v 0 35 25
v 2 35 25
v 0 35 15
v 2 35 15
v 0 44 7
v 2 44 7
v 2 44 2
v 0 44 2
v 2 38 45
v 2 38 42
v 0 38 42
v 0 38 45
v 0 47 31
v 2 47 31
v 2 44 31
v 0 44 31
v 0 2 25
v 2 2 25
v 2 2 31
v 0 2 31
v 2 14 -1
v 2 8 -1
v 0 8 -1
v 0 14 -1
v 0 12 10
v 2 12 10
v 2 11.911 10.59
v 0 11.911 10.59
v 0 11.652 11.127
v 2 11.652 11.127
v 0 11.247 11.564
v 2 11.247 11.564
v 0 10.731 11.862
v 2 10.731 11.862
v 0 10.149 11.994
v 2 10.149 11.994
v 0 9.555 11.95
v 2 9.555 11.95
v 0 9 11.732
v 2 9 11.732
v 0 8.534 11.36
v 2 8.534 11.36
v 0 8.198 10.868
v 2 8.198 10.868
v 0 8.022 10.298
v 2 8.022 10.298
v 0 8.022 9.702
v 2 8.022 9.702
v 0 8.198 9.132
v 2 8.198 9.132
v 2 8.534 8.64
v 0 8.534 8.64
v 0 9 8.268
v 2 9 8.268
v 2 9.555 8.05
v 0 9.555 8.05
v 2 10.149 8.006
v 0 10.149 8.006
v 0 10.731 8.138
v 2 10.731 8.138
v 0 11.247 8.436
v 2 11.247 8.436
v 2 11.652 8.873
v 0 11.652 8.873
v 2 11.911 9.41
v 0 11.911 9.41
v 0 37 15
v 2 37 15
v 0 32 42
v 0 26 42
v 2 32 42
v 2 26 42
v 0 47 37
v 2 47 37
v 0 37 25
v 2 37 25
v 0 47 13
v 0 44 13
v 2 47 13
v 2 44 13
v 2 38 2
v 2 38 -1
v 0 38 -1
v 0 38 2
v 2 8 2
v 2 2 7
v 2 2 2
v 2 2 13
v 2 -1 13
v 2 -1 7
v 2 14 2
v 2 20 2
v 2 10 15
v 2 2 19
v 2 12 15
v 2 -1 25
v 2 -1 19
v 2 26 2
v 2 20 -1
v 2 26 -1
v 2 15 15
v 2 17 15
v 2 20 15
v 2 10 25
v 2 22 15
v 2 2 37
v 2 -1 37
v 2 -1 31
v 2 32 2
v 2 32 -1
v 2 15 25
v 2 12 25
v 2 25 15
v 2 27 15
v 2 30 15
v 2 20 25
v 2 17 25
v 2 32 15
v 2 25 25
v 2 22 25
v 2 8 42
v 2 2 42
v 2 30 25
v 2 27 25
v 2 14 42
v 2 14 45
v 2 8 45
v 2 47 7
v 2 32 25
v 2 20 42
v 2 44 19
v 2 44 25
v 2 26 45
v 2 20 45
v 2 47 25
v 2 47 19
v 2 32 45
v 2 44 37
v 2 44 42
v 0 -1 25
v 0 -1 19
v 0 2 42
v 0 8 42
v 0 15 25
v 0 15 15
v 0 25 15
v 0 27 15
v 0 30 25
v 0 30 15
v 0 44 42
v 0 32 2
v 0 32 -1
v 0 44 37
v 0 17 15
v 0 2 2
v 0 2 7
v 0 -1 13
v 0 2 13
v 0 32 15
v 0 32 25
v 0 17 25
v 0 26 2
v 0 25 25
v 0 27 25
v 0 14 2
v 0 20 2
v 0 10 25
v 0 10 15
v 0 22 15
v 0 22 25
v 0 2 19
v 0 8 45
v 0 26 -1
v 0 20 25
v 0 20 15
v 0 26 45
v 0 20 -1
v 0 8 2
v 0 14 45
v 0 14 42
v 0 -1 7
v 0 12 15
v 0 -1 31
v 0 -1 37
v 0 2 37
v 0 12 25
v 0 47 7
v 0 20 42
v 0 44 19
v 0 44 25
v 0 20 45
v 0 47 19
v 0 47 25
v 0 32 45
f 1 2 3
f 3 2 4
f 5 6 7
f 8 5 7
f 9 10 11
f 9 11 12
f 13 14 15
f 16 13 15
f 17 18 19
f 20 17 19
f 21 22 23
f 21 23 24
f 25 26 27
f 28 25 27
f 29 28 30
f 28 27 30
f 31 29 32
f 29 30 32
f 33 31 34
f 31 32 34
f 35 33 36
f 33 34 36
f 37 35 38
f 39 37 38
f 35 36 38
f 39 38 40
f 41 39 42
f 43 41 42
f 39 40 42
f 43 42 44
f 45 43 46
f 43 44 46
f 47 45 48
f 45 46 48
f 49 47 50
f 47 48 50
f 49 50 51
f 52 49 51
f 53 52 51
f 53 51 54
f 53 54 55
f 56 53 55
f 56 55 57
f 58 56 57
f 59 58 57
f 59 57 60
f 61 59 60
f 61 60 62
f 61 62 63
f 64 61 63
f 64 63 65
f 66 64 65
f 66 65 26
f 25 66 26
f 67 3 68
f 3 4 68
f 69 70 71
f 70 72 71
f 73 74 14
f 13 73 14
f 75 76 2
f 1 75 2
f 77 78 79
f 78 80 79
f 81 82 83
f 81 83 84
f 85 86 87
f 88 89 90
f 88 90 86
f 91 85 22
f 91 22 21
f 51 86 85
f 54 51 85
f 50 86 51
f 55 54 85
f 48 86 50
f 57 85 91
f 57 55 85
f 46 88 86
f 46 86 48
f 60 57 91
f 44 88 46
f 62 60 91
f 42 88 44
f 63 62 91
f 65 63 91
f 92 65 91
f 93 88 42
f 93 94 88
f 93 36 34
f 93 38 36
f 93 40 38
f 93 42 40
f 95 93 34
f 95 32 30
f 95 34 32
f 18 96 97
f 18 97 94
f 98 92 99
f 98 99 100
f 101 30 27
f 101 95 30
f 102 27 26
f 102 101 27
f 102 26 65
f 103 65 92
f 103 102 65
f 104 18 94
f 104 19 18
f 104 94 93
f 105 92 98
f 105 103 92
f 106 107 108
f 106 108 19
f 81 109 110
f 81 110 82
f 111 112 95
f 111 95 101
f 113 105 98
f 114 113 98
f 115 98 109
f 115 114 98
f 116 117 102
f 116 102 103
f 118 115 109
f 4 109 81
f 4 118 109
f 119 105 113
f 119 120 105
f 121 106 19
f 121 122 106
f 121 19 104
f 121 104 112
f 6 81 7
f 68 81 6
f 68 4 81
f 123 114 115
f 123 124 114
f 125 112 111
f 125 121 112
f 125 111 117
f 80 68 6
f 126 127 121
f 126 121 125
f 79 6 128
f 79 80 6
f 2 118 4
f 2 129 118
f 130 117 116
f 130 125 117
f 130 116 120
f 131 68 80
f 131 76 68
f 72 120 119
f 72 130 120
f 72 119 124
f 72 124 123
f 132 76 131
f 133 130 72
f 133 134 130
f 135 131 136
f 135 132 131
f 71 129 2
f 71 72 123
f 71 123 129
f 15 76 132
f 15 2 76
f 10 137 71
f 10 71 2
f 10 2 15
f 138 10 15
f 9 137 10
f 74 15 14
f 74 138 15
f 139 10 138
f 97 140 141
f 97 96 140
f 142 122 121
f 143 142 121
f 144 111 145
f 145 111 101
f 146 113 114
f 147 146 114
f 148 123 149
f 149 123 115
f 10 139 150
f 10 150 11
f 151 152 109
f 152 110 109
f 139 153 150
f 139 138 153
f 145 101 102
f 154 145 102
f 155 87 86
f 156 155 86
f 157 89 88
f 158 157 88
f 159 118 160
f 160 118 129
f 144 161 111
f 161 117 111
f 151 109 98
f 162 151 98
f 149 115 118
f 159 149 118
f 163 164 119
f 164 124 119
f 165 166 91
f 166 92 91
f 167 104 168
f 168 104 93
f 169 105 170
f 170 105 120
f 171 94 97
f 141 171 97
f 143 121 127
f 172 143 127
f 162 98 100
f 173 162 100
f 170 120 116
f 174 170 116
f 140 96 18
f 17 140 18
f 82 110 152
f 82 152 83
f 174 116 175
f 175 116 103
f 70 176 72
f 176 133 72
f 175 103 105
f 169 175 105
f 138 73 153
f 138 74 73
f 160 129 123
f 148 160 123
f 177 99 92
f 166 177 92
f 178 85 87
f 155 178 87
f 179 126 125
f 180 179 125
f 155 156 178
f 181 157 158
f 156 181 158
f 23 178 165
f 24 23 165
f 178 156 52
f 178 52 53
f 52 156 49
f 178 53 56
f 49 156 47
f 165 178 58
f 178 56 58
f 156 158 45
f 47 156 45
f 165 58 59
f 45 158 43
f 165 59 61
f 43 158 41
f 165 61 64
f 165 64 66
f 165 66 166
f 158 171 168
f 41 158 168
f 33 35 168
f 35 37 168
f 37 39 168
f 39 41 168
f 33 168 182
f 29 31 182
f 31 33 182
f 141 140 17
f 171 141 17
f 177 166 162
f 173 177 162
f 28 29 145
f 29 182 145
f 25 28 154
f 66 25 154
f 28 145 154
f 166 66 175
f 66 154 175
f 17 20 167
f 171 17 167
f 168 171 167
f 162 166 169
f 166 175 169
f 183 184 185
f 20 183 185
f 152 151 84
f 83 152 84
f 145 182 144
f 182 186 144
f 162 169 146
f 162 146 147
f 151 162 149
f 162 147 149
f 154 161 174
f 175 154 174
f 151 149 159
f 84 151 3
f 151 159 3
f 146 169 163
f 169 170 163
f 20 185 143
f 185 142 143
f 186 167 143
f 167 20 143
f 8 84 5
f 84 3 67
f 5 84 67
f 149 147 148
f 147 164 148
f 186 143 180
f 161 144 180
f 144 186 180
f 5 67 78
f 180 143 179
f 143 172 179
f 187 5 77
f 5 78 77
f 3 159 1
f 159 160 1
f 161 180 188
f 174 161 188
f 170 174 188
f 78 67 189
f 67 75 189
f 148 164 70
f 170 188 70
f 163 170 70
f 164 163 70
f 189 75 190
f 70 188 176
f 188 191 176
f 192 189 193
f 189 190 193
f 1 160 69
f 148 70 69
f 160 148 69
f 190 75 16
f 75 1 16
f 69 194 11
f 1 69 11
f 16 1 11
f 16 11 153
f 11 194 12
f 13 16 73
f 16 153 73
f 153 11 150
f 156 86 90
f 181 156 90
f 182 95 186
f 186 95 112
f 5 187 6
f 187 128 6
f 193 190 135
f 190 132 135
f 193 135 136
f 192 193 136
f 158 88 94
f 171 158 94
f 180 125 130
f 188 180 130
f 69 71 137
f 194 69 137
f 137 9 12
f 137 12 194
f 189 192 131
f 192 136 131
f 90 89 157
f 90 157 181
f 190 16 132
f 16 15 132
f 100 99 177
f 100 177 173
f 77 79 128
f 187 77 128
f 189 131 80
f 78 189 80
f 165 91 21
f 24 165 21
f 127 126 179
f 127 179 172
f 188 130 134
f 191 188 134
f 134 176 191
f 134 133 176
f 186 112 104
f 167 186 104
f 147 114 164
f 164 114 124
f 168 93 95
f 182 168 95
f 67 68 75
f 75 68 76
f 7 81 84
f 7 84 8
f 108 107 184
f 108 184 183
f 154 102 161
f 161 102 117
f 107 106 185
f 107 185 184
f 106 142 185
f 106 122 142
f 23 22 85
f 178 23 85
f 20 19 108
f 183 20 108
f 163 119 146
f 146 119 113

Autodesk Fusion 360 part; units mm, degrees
sketch "スケッチ1" plane through (0, 0, 0) normal (1, 0, 0) x (0, 1, 0)
  line L0 (0, 0) -> (46, 0)
  line L1 (46, 0) -> (46, 44)
  line L2 (46, 44) -> (0, 44)
  line L3 (0, 44) -> (0, 0)
  dimension "d1" = 46
  dimension "d2" = 44
extrude "押し出し1" add sketch "スケッチ1" along normal blind 2
sketch "スケッチ2" plane through (2, 0, 0) normal (1, 0, 0) x (0, 1, 0)
  line L0 (0, 44) -> (0, 0)
  line L1 (0, 0) -> (46, 0)
  line L2 (46, 0) -> (46, 44)
  line L3 (46, 44) -> (0, 44)
  line L4 (0, 0) -> (8, 0)
  line L5 (8, 0) -> (8, 2)
  line L6 (8, 2) -> (0, 2)
  line L7 (0, 2) -> (0, 0)
  line L8 (14, 0) -> (20, 0)
  line L9 (20, 0) -> (20, 2)
  line L10 (20, 2) -> (14, 2)
  line L11 (14, 2) -> (14, 0)
  line L12 (26, 0) -> (32, 0)
  line L13 (32, 0) -> (32, 2)
  line L14 (32, 2) -> (26, 2)
  line L15 (26, 2) -> (26, 0)
  line L16 (46, 0) -> (38, 0)
  line L17 (38, 0) -> (38, 2)
  line L18 (38, 2) -> (46, 2)
  line L19 (46, 2) -> (46, 0)
  line L20 (32, 42) -> (32, 44)
  line L21 (32, 44) -> (26, 44)
  line L22 (20, 42) -> (20, 44)
  line L23 (38, 42) -> (38, 44)
  line L24 (38, 44) -> (46, 44)
  line L25 (46, 44) -> (46, 42)
  line L26 (0, 42) -> (8, 42)
  line L27 (26, 44) -> (26, 42)
  line L28 (8, 42) -> (8, 44)
  line L29 (8, 44) -> (0, 44)
  line L30 (0, 44) -> (0, 42)
  line L31 (20, 44) -> (14, 44)
  line L32 (26, 42) -> (32, 42)
  line L33 (46, 42) -> (38, 42)
  line L34 (14, 42) -> (20, 42)
  line L35 (14, 44) -> (14, 42)
  point P0 (0, 42)
  dimension "d5" = 8
  dimension "d6" = 2
  dimension "d7" = 6
  dimension "d8" = 2
  dimension "d9" = 6
  dimension "d10" = 6
  dimension "d11" = 2
  dimension "d12" = 6
  dimension "d13" = 6
  dimension "d14" = 2
extrude "押し出し2" cut sketch "スケッチ2" against normal blind 2 contours L0 L3 L26 L28 L29 L30 | L0 L1 L4 L5 L6 L7 | L3 L22 L31 L34 L35 | L3 L20 L21 L27 L32 | L1 L8 L9 L10 L11 | L2 L3 L23 L24 L25 L33 | L1 L12 L13 L14 L15 | L1 L2 L16 L17 L18 L19
sketch "スケッチ3" plane through (2, 0, 0) normal (1, 0, 0) x (0, 1, 0)
  line L0 (8, 2) -> (8, 0)
  line L1 (8, 0) -> (14, 0)
  line L2 (14, 0) -> (14, 2)
  line L3 (14, 2) -> (20, 2)
  line L4 (20, 2) -> (20, 0)
  line L5 (20, 0) -> (26, 0)
  line L6 (26, 0) -> (26, 2)
  line L7 (26, 2) -> (32, 2)
  line L8 (32, 2) -> (32, 0)
  line L9 (32, 0) -> (38, 0)
  line L10 (38, 0) -> (38, 2)
  line L11 (38, 2) -> (46, 2)
  line L12 (46, 2) -> (46, 42)
  line L13 (46, 42) -> (38, 42)
  line L14 (38, 42) -> (38, 44)
  line L15 (38, 44) -> (32, 44)
  line L16 (32, 44) -> (32, 42)
  line L17 (32, 42) -> (26, 42)
  line L18 (26, 42) -> (26, 44)
  line L19 (26, 44) -> (20, 44)
  line L20 (20, 44) -> (20, 42)
  line L21 (20, 42) -> (14, 42)
  line L22 (14, 42) -> (14, 44)
  line L23 (14, 44) -> (8, 44)
  line L24 (8, 44) -> (8, 42)
  line L25 (8, 42) -> (0, 42)
  line L26 (0, 42) -> (0, 2)
  line L27 (0, 2) -> (8, 2)
  line L28 (0, 44) -> (2, 44)
  line L29 (2, 44) -> (2, 37)
  line L30 (2, 37) -> (0, 37)
  line L31 (0, 37) -> (0, 44)
  line L32 (2, 31) -> (0, 31)
  line L33 (0, 31) -> (0, 25)
  line L34 (0, 25) -> (2, 25)
  line L35 (2, 25) -> (2, 31)
  line L36 (2, 19) -> (0, 19)
  line L37 (0, 19) -> (0, 13)
  line L38 (0, 13) -> (2, 13)
  line L39 (2, 13) -> (2, 19)
  line L40 (2, 7) -> (0, 7)
  line L41 (0, 7) -> (0, 0)
  line L42 (0, 0) -> (2, 0)
  line L43 (2, 0) -> (2, 7)
  line L44 (46, 31) -> (44, 31)
  line L45 (46, 13) -> (46, 19)
  line L46 (44, 44) -> (46, 44)
  line L47 (44, 0) -> (46, 0)
  line L48 (44, 7) -> (44, 0)
  line L49 (44, 25) -> (46, 25)
  line L50 (46, 37) -> (44, 37)
  line L51 (44, 37) -> (44, 44)
  line L52 (44, 13) -> (46, 13)
  line L53 (44, 31) -> (44, 25)
  line L54 (46, 19) -> (44, 19)
  line L55 (44, 19) -> (44, 13)
  line L56 (46, 25) -> (46, 31)
  line L57 (46, 7) -> (44, 7)
  line L58 (46, 0) -> (46, 7)
  line L59 (46, 44) -> (46, 37)
  point P0 (44, 0)
  dimension "d21" = 2
  dimension "d22" = 7
  dimension "d23" = 2
  dimension "d24" = 6
  dimension "d25" = 6
  dimension "d26" = 6
  dimension "d27" = 6
  dimension "d28" = 2
  dimension "d29" = 6
  dimension "d30" = 7
  dimension "d31" = 2
extrude "押し出し3" cut sketch "スケッチ3" against normal blind 2 contours L27 L41 L42 L43 | L26 L27 L40 L41 L43 | L26 L36 L37 L38 L39 | L26 L32 L33 L34 L35 | L25 L26 L29 L30 L31 | L25 L28 L29 L31 | L11 L12 L48 L57 L58 | L11 L47 L48 L58 | L12 L45 L52 L54 L55 | L12 L44 L49 L53 L56 | L12 L13 L50 L51 L59 | L13 L46 L51 L59
sketch "スケッチ4" plane through (2, 0, 0) normal (1, 0, 0) x (0, 1, 0)
  line L0 (44, 19) -> (46, 19)
  line L1 (46, 19) -> (46, 25)
  line L2 (46, 25) -> (44, 25)
  line L3 (44, 25) -> (44, 31)
  line L4 (44, 31) -> (46, 31)
  line L5 (46, 31) -> (46, 37)
  line L6 (46, 37) -> (44, 37)
  line L7 (44, 37) -> (44, 42)
  line L8 (44, 42) -> (38, 42)
  line L9 (38, 42) -> (38, 44)
  line L10 (38, 44) -> (32, 44)
  line L11 (32, 44) -> (32, 42)
  line L12 (32, 42) -> (26, 42)
  line L13 (26, 42) -> (26, 44)
  line L14 (26, 44) -> (20, 44)
  line L15 (20, 44) -> (20, 42)
  line L16 (20, 42) -> (14, 42)
  line L17 (14, 42) -> (14, 44)
  line L18 (14, 44) -> (8, 44)
  line L19 (8, 44) -> (8, 42)
  line L20 (8, 42) -> (2, 42)
  line L21 (2, 42) -> (2, 37)
  line L22 (2, 37) -> (0, 37)
  line L23 (0, 37) -> (0, 31)
  line L24 (0, 31) -> (2, 31)
  line L25 (2, 31) -> (2, 25)
  line L26 (2, 25) -> (0, 25)
  line L27 (0, 25) -> (0, 19)
  line L28 (0, 19) -> (2, 19)
  line L29 (2, 19) -> (2, 13)
  line L30 (2, 13) -> (0, 13)
  line L31 (0, 13) -> (0, 7)
  line L32 (0, 7) -> (2, 7)
  line L33 (2, 7) -> (2, 2)
  line L34 (2, 2) -> (8, 2)
  line L35 (8, 2) -> (8, 0)
  line L36 (8, 0) -> (14, 0)
  line L37 (14, 0) -> (14, 2)
  line L38 (14, 2) -> (20, 2)
  line L39 (20, 2) -> (20, 0)
  line L40 (20, 0) -> (26, 0)
  line L41 (26, 0) -> (26, 2)
  line L42 (26, 2) -> (32, 2)
  line L43 (32, 2) -> (32, 0)
  line L44 (32, 0) -> (38, 0)
  line L45 (38, 0) -> (38, 2)
  line L46 (38, 2) -> (44, 2)
  line L47 (44, 2) -> (44, 7)
  line L48 (44, 7) -> (46, 7)
  line L49 (46, 7) -> (46, 13)
  line L50 (46, 13) -> (44, 13)
  line L51 (44, 13) -> (44, 19)
  line L52 (10, 15) -> (12, 15)
  line L53 (12, 15) -> (12, 25)
  line L54 (12, 25) -> (10, 25)
  line L55 (10, 25) -> (10, 15)
  line L56 (15, 15) -> (17, 15)
  line L57 (17, 15) -> (17, 25)
  line L58 (17, 25) -> (15, 25)
  line L59 (15, 25) -> (15, 15)
  line L60 (20, 15) -> (22, 15)
  line L61 (22, 15) -> (22, 25)
  line L62 (22, 25) -> (20, 25)
  line L63 (20, 25) -> (20, 15)
  line L64 (25, 15) -> (27, 15)
  line L65 (27, 15) -> (27, 25)
  line L66 (27, 25) -> (25, 25)
  line L67 (25, 25) -> (25, 15)
  line L68 (30, 15) -> (32, 15)
  line L69 (32, 15) -> (32, 25)
  line L70 (32, 25) -> (30, 25)
  line L71 (30, 25) -> (30, 15)
  line L72 (35, 15) -> (37, 15)
  line L73 (37, 15) -> (37, 25)
  line L74 (37, 25) -> (35, 25)
  line L75 (35, 25) -> (35, 15)
extrude "押し出し4" cut sketch "スケッチ4" against normal blind 2 contours L52 L53 L54 L55 | L56 L57 L58 L59 | L60 L61 L62 L63 | L64 L65 L66 L67 | L68 L69 L70 L71 | L72 L73 L74 L75
sketch "スケッチ5" plane through (2, 0, 0) normal (1, 0, 0) x (0, 1, 0)
  line L0 (37, 15) -> (35, 15)
  line L1 (35, 15) -> (35, 25)
  line L2 (35, 25) -> (37, 25)
  line L3 (37, 25) -> (37, 15)
  line L4 (32, 15) -> (30, 15)
  line L5 (30, 15) -> (30, 25)
  line L6 (30, 25) -> (32, 25)
  line L7 (32, 25) -> (32, 15)
  line L8 (17, 15) -> (15, 15)
  line L9 (15, 15) -> (15, 25)
  line L10 (15, 25) -> (17, 25)
  line L11 (17, 25) -> (17, 15)
  line L12 (12, 15) -> (10, 15)
  line L13 (10, 15) -> (10, 25)
  line L14 (10, 25) -> (12, 25)
  line L15 (12, 25) -> (12, 15)
  line L16 (22, 15) -> (20, 15)
  line L17 (20, 15) -> (20, 25)
  line L18 (20, 25) -> (22, 25)
  line L19 (22, 25) -> (22, 15)
  line L20 (27, 15) -> (25, 15)
  line L21 (25, 15) -> (25, 25)
  line L22 (25, 25) -> (27, 25)
  line L23 (27, 25) -> (27, 15)
  line L24 (44, 19) -> (46, 19)
  line L25 (46, 19) -> (46, 25)
  line L26 (46, 25) -> (44, 25)
  line L27 (44, 25) -> (44, 31)
  line L28 (44, 31) -> (46, 31)
  line L29 (46, 31) -> (46, 37)
  line L30 (46, 37) -> (44, 37)
  line L31 (44, 37) -> (44, 42)
  line L32 (44, 42) -> (38, 42)
  line L33 (38, 42) -> (38, 44)
  line L34 (38, 44) -> (32, 44)
  line L35 (32, 44) -> (32, 42)
  line L36 (32, 42) -> (26, 42)
  line L37 (26, 42) -> (26, 44)
  line L38 (26, 44) -> (20, 44)
  line L39 (20, 44) -> (20, 42)
  line L40 (20, 42) -> (14, 42)
  line L41 (14, 42) -> (14, 44)
  line L42 (14, 44) -> (8, 44)
  line L43 (8, 44) -> (8, 42)
  line L44 (8, 42) -> (2, 42)
  line L45 (2, 42) -> (2, 37)
  line L46 (2, 37) -> (0, 37)
  line L47 (0, 37) -> (0, 31)
  line L48 (0, 31) -> (2, 31)
  line L49 (2, 31) -> (2, 25)
  line L50 (2, 25) -> (0, 25)
  line L51 (0, 25) -> (0, 19)
  line L52 (0, 19) -> (2, 19)
  line L53 (2, 19) -> (2, 13)
  line L54 (2, 13) -> (0, 13)
  line L55 (0, 13) -> (0, 7)
  line L56 (0, 7) -> (2, 7)
  line L57 (2, 7) -> (2, 2)
  line L58 (2, 2) -> (8, 2)
  line L59 (8, 2) -> (8, 0)
  line L60 (8, 0) -> (14, 0)
  line L61 (14, 0) -> (14, 2)
  line L62 (14, 2) -> (20, 2)
  line L63 (20, 2) -> (20, 0)
  line L64 (20, 0) -> (26, 0)
  line L65 (26, 0) -> (26, 2)
  line L66 (26, 2) -> (32, 2)
  line L67 (32, 2) -> (32, 0)
  line L68 (32, 0) -> (38, 0)
  line L69 (38, 0) -> (38, 2)
  line L70 (38, 2) -> (44, 2)
  line L71 (44, 2) -> (44, 7)
  line L72 (44, 7) -> (46, 7)
  line L73 (46, 7) -> (46, 13)
  line L74 (46, 13) -> (44, 13)
  line L75 (44, 13) -> (44, 19)
  circle A0 centre (10, 10) radius 2
extrude "押し出し5" cut sketch "スケッチ5" against normal blind 2 contours A0
sketch "スケッチ6" plane through (2, 0, 0) normal (1, 0, 0) x (0, 1, 0)
  circle A0 centre (10, 10) radius 2
  line L0 (37, 15) -> (35, 15)
  line L1 (35, 15) -> (35, 25)
  line L2 (35, 25) -> (37, 25)
  line L3 (37, 25) -> (37, 15)
  line L4 (32, 15) -> (30, 15)
  line L5 (30, 15) -> (30, 25)
  line L6 (30, 25) -> (32, 25)
  line L7 (32, 25) -> (32, 15)
  line L8 (17, 15) -> (15, 15)
  line L9 (15, 15) -> (15, 25)
  line L10 (15, 25) -> (17, 25)
  line L11 (17, 25) -> (17, 15)
  line L12 (12, 15) -> (10, 15)
  line L13 (10, 15) -> (10, 25)
  line L14 (10, 25) -> (12, 25)
  line L15 (12, 25) -> (12, 15)
  line L16 (22, 15) -> (20, 15)
  line L17 (20, 15) -> (20, 25)
  line L18 (20, 25) -> (22, 25)
  line L19 (22, 25) -> (22, 15)
  line L20 (27, 15) -> (25, 15)
  line L21 (25, 15) -> (25, 25)
  line L22 (25, 25) -> (27, 25)
  line L23 (27, 25) -> (27, 15)
  line L24 (44, 19) -> (46, 19)
  line L25 (46, 19) -> (46, 25)
  line L26 (46, 25) -> (44, 25)
  line L27 (44, 25) -> (44, 31)
  line L28 (44, 31) -> (46, 31)
  line L29 (46, 31) -> (46, 37)
  line L30 (46, 37) -> (44, 37)
  line L31 (44, 37) -> (44, 42)
  line L32 (44, 42) -> (38, 42)
  line L33 (38, 42) -> (38, 44)
  line L34 (38, 44) -> (32, 44)
  line L35 (32, 44) -> (32, 42)
  line L36 (32, 42) -> (26, 42)
  line L37 (26, 42) -> (26, 44)
  line L38 (26, 44) -> (20, 44)
  line L39 (20, 44) -> (20, 42)
  line L40 (20, 42) -> (14, 42)
  line L41 (14, 42) -> (14, 44)
  line L42 (14, 44) -> (8, 44)
  line L43 (8, 44) -> (8, 42)
  line L44 (8, 42) -> (2, 42)
  line L45 (2, 42) -> (2, 37)
  line L46 (2, 37) -> (0, 37)
  line L47 (0, 37) -> (0, 31)
  line L48 (0, 31) -> (2, 31)
  line L49 (2, 31) -> (2, 25)
  line L50 (2, 25) -> (0, 25)
  line L51 (0, 25) -> (0, 19)
  line L52 (0, 19) -> (2, 19)
  line L53 (2, 19) -> (2, 13)
  line L54 (2, 13) -> (0, 13)
  line L55 (0, 13) -> (0, 7)
  line L56 (0, 7) -> (2, 7)
  line L57 (2, 7) -> (2, 2)
  line L58 (2, 2) -> (8, 2)
  line L59 (8, 2) -> (8, 0)
  line L60 (8, 0) -> (14, 0)
  line L61 (14, 0) -> (14, 2)
  line L62 (14, 2) -> (20, 2)
  line L63 (20, 2) -> (20, 0)
  line L64 (20, 0) -> (26, 0)
  line L65 (26, 0) -> (26, 2)
  line L66 (26, 2) -> (32, 2)
  line L67 (32, 2) -> (32, 0)
  line L68 (32, 0) -> (38, 0)
  line L69 (38, 0) -> (38, 2)
  line L70 (38, 2) -> (44, 2)
  line L71 (44, 2) -> (44, 7)
  line L72 (44, 7) -> (46, 7)
  line L73 (46, 7) -> (46, 13)
  line L74 (46, 13) -> (44, 13)
  line L75 (44, 13) -> (44, 19)
  line L76 (8, 44) -> (14, 44)
  line L77 (14, 44) -> (14, 45)
  line L78 (14, 45) -> (8, 45)
  line L79 (8, 45) -> (8, 44)
  line L80 (20, 44) -> (26, 44)
  line L81 (26, 44) -> (26, 45)
  line L82 (26, 45) -> (20, 45)
  line L83 (20, 45) -> (20, 44)
  line L84 (32, 44) -> (38, 44)
  line L85 (38, 44) -> (38, 45)
  line L86 (38, 45) -> (32, 45)
  line L87 (32, 45) -> (32, 44)
  line L88 (46, 37) -> (47, 37)
  line L89 (47, 37) -> (47, 31)
  line L90 (47, 31) -> (46, 31)
  line L91 (46, 31) -> (46, 37)
  line L92 (46, 25) -> (47, 25)
  line L93 (47, 25) -> (47, 19)
  line L94 (47, 19) -> (46, 19)
  line L95 (46, 19) -> (46, 25)
  line L96 (46, 13) -> (47, 13)
  line L97 (47, 13) -> (47, 7)
  line L98 (47, 7) -> (46, 7)
  line L99 (46, 7) -> (46, 13)
  line L100 (38, 0) -> (32, 0)
  line L101 (32, 0) -> (32, -1)
  line L102 (32, -1) -> (38, -1)
  line L103 (38, -1) -> (38, 0)
  line L104 (26, 0) -> (20, 0)
  line L105 (20, 0) -> (20, -1)
  line L106 (20, -1) -> (26, -1)
  line L107 (26, -1) -> (26, 0)
  line L108 (14, 0) -> (8, 0)
  line L109 (8, 0) -> (8, -1)
  line L110 (8, -1) -> (14, -1)
  line L111 (14, -1) -> (14, 0)
  line L112 (-1, 7) -> (0, 7)
  line L113 (0, 7) -> (0, 13)
  line L114 (0, 13) -> (-1, 13)
  line L115 (-1, 13) -> (-1, 7)
  line L116 (-1, 19) -> (0, 19)
  line L117 (0, 19) -> (0, 25)
  line L118 (0, 25) -> (-1, 25)
  line L119 (-1, 25) -> (-1, 19)
  line L120 (-1, 31) -> (0, 31)
  line L121 (0, 31) -> (0, 37)
  line L122 (0, 37) -> (-1, 37)
  line L123 (-1, 37) -> (-1, 31)
extrude "押し出し6" add sketch "スケッチ6" against normal blind 2 contours L25 L92 L93 L94 L95 | L73 L96 L97 L98 L99 | L29 L88 L89 L90 L91 | L68 L100 L101 L102 L103 | L34 L84 L85 L86 L87 | L64 L104 L105 L106 L107 | L38 L80 L81 L82 L83 | L60 L108 L109 L110 L111 | L42 L76 L77 L78 L79 | L55 L112 L113 L114 L115 | L47 L120 L121 L122 L123 | L51 L116 L117 L118 L119
sketch "スケッチ7" plane through (2, 0, 0) normal (1, 0, 0) x (0, 1, 0)
  circle A0 centre (10, 10) radius 2
  line L0 (37, 15) -> (35, 15)
  line L1 (35, 15) -> (35, 25)
  line L2 (35, 25) -> (37, 25)
  line L3 (37, 25) -> (37, 15)
  line L4 (32, 15) -> (30, 15)
  line L5 (30, 15) -> (30, 25)
  line L6 (30, 25) -> (32, 25)
  line L7 (32, 25) -> (32, 15)
  line L8 (17, 15) -> (15, 15)
  line L9 (15, 15) -> (15, 25)
  line L10 (15, 25) -> (17, 25)
  line L11 (17, 25) -> (17, 15)
  line L12 (12, 15) -> (10, 15)
  line L13 (10, 15) -> (10, 25)
  line L14 (10, 25) -> (12, 25)
  line L15 (12, 25) -> (12, 15)
  line L16 (22, 15) -> (20, 15)
  line L17 (20, 15) -> (20, 25)
  line L18 (20, 25) -> (22, 25)
  line L19 (22, 25) -> (22, 15)
  line L20 (27, 15) -> (25, 15)
  line L21 (25, 15) -> (25, 25)
  line L22 (25, 25) -> (27, 25)
  line L23 (27, 25) -> (27, 15)
  line L24 (44, 19) -> (47, 19)
  line L25 (47, 19) -> (47, 25)
  line L26 (47, 25) -> (44, 25)
  line L27 (44, 25) -> (44, 31)
  line L28 (44, 31) -> (47, 31)
  line L29 (47, 31) -> (47, 37)
  line L30 (47, 37) -> (44, 37)
  line L31 (44, 37) -> (44, 42)
  line L32 (44, 42) -> (38, 42)
  line L33 (38, 42) -> (38, 45)
  line L34 (38, 45) -> (32, 45)
  line L35 (32, 45) -> (32, 42)
  line L36 (32, 42) -> (26, 42)
  line L37 (26, 42) -> (26, 45)
  line L38 (26, 45) -> (20, 45)
  line L39 (20, 45) -> (20, 42)
  line L40 (20, 42) -> (14, 42)
  line L41 (14, 42) -> (14, 45)
  line L42 (14, 45) -> (8, 45)
  line L43 (8, 45) -> (8, 42)
  line L44 (8, 42) -> (2, 42)
  line L45 (2, 42) -> (2, 37)
  line L46 (2, 37) -> (-1, 37)
  line L47 (-1, 37) -> (-1, 31)
  line L48 (-1, 31) -> (2, 31)
  line L49 (2, 31) -> (2, 25)
  line L50 (2, 25) -> (-1, 25)
  line L51 (-1, 25) -> (-1, 19)
  line L52 (-1, 19) -> (2, 19)
  line L53 (2, 19) -> (2, 13)
  line L54 (2, 13) -> (-1, 13)
  line L55 (-1, 13) -> (-1, 7)
  line L56 (-1, 7) -> (2, 7)
  line L57 (2, 7) -> (2, 2)
  line L58 (2, 2) -> (8, 2)
  line L59 (8, 2) -> (8, -1)
  line L60 (8, -1) -> (14, -1)
  line L61 (14, -1) -> (14, 2)
  line L62 (14, 2) -> (20, 2)
  line L63 (20, 2) -> (20, -1)
  line L64 (20, -1) -> (26, -1)
  line L65 (26, -1) -> (26, 2)
  line L66 (26, 2) -> (32, 2)
  line L67 (32, 2) -> (32, -1)
  line L68 (32, -1) -> (38, -1)
  line L69 (38, -1) -> (38, 2)
  line L70 (38, 2) -> (44, 2)
  line L71 (44, 2) -> (44, 7)
  line L72 (44, 7) -> (47, 7)
  line L73 (47, 7) -> (47, 13)
  line L74 (47, 13) -> (44, 13)
  line L75 (44, 13) -> (44, 19)
